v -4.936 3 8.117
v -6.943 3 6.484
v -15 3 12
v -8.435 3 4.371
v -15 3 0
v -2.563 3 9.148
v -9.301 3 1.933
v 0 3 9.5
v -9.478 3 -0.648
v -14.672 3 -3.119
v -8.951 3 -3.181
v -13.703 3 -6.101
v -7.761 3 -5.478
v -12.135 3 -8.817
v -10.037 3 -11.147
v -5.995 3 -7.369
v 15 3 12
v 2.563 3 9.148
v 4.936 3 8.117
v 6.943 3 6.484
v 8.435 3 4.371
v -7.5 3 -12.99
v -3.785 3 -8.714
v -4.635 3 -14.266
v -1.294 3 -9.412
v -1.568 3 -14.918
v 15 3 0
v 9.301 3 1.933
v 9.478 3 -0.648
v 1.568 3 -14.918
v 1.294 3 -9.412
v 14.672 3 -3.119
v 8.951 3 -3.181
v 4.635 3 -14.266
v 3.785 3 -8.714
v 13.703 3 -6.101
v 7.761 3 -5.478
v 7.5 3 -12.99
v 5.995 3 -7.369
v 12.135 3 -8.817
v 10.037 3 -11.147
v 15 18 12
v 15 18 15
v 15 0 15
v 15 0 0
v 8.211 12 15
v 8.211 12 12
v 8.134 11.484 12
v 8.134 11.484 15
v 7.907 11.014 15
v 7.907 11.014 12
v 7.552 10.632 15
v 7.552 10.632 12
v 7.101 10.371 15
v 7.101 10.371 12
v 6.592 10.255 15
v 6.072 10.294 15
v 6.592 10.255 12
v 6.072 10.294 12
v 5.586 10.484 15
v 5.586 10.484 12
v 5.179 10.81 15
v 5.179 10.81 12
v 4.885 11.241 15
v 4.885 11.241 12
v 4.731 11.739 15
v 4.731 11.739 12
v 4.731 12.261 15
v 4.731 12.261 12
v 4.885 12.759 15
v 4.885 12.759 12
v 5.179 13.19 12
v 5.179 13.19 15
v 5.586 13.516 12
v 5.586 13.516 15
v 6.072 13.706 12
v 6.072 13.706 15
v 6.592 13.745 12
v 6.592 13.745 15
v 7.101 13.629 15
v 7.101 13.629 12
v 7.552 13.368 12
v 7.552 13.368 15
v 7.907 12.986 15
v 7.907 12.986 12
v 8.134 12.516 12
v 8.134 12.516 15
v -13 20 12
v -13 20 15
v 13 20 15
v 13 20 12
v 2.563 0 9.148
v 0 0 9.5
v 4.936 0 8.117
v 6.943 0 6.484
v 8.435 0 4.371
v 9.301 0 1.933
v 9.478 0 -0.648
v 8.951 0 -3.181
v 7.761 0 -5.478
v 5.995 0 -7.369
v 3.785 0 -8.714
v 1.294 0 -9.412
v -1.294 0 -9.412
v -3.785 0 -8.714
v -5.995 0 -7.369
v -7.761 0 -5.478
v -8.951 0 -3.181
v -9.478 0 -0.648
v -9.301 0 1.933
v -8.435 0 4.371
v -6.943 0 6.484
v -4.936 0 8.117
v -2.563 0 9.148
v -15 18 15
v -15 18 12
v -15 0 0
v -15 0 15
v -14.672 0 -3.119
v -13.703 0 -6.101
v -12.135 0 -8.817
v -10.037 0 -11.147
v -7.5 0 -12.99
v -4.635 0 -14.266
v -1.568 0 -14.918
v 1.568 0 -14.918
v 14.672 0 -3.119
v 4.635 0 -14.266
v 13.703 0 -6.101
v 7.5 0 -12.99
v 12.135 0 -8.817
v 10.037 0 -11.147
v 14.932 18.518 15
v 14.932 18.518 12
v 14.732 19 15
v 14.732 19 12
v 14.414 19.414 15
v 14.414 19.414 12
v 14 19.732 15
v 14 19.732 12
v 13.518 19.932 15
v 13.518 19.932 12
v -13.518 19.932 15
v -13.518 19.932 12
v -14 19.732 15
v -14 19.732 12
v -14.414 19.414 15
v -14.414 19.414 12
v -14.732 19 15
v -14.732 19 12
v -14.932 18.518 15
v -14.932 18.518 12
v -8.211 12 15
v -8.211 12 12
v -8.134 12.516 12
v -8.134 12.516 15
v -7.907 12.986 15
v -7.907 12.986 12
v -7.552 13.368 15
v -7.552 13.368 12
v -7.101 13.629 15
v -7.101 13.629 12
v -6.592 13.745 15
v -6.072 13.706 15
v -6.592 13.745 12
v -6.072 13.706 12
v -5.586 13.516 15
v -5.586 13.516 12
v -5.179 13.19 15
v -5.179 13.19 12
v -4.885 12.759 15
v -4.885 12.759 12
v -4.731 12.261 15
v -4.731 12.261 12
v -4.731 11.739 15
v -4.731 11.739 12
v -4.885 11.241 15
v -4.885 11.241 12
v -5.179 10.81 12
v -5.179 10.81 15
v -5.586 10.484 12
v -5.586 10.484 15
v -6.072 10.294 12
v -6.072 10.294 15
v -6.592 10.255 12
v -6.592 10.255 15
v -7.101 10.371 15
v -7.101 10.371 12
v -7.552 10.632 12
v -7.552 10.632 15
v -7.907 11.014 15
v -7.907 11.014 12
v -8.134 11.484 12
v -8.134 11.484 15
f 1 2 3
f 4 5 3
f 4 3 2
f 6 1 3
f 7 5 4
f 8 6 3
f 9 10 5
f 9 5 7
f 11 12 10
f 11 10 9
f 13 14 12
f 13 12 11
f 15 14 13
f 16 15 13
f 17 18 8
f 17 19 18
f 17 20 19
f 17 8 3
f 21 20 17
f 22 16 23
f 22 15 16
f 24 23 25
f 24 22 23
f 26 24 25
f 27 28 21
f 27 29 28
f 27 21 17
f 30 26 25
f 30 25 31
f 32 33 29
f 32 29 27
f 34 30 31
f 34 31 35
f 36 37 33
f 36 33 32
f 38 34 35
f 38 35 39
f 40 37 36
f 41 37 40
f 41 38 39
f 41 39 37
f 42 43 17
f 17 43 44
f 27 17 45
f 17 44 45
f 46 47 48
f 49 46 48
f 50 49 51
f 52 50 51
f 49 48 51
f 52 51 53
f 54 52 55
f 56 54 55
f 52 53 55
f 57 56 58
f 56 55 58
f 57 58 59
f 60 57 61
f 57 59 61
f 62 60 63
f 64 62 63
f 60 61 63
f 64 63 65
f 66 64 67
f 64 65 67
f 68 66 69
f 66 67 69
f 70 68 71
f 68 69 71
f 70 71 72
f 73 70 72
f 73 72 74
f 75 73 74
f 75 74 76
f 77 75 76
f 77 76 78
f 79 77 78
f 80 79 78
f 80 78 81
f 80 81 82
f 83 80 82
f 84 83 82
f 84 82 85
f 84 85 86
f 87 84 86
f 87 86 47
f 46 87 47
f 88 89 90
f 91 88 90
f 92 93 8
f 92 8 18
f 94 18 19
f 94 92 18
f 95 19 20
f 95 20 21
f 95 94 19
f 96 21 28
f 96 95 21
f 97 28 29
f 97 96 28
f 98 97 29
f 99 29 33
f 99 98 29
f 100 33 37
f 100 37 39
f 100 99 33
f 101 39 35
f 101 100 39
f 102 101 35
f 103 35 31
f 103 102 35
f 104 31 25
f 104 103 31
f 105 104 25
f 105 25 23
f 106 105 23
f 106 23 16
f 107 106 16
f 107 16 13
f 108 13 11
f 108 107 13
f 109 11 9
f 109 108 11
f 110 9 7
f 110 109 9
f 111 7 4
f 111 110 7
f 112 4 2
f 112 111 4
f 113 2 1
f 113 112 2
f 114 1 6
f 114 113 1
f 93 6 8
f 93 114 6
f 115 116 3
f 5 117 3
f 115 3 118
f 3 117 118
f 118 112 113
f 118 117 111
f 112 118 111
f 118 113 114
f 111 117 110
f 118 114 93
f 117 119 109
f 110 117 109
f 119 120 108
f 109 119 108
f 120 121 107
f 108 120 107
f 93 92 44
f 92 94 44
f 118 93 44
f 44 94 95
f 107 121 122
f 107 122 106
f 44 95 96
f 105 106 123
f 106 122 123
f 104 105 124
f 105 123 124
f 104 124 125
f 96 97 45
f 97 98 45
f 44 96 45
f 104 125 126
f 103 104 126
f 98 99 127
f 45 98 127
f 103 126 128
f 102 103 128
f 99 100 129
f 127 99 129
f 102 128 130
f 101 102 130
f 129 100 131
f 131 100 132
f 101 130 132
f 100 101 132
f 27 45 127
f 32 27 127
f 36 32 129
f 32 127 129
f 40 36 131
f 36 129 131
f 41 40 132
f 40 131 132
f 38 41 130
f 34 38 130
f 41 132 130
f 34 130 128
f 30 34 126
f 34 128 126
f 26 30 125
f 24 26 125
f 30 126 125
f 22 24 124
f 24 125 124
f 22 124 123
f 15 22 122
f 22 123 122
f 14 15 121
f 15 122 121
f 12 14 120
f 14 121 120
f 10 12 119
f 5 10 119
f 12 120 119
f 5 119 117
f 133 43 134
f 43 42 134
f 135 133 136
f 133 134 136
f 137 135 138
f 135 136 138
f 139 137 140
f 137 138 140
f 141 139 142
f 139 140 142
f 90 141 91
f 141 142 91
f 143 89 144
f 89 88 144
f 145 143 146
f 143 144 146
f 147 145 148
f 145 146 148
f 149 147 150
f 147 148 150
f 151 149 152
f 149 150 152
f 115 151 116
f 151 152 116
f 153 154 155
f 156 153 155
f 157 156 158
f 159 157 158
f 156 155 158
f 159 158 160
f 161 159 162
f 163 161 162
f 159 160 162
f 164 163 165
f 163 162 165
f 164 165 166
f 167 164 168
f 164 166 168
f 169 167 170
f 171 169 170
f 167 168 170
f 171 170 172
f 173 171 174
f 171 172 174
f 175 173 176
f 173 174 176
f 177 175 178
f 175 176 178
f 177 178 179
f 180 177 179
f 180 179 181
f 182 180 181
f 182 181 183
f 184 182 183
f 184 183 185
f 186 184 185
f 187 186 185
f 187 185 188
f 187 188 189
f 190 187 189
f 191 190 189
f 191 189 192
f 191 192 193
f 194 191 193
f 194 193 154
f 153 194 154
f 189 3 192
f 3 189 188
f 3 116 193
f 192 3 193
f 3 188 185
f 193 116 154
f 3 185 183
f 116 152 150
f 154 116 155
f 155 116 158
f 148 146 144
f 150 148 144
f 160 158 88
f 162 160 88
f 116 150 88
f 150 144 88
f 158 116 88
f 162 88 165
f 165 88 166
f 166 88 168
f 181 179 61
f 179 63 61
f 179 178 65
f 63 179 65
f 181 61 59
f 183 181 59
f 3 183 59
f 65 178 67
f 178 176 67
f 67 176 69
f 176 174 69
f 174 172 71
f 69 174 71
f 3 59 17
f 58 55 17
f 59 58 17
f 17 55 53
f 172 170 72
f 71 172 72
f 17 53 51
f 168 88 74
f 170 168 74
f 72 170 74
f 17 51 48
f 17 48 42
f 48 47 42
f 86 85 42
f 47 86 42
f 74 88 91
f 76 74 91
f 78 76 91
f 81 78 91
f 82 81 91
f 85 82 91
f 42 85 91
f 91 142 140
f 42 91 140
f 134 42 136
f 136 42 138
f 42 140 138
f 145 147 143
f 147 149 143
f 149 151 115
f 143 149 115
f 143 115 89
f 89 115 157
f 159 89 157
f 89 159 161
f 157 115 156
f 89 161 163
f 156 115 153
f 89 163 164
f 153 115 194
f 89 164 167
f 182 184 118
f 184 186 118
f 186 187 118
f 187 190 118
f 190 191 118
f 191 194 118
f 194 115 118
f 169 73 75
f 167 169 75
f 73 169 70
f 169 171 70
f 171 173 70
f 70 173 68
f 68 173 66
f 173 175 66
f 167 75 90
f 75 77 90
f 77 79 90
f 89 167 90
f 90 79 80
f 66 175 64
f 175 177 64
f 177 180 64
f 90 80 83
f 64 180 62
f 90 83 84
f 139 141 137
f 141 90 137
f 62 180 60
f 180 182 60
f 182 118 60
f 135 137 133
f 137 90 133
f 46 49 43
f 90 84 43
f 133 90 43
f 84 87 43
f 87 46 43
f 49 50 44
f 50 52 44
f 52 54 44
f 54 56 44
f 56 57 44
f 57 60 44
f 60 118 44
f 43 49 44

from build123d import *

# Parameters (mm, degrees)
SKETCH_1_R          = 9.5
EXTRUDE_2_DEPTH     = 3
SKETCH_9_W          = 30
SKETCH_9_H          = 20
EXTRUDE_3_DEPTH     = 3
SKETCH_10_R         = 1.75
CUT_EXTRUDE_1_DEPTH = 37.796738986
FILLET_6_R          = 2


with BuildPart() as part:
    # 草图1 → 凸台-拉伸2 (new body)
    with BuildSketch(Plane(origin=(0, 0, 0), x_dir=(1, 0, 0), z_dir=(0, 1, 0))):
        with BuildLine():
            Line((15, -15), (15, 0))
            ThreePointArc((15, 0), (0, 15), (-15, 0))
            Line((-15, 0), (-15, -15))
            Line((-15, -15), (15, -15))
        make_face()
        with Locations(Location((0, 0, 0), (0, 0, 270))):
            Circle(SKETCH_1_R, mode=Mode.SUBTRACT)
    extrude(amount=EXTRUDE_2_DEPTH)

    # 草图9 → 凸台-拉伸3 (add)
    with BuildSketch(Plane.XY.offset(15)):
        with Locations((0, 10)):
            Rectangle(SKETCH_9_W, SKETCH_9_H)
    extrude(amount=-EXTRUDE_3_DEPTH)

    # 草图10 → 切除-拉伸1 (cut, through all)
    with BuildSketch(Plane(origin=(0, 0, 12), x_dir=(-1, 0, 0), z_dir=(0, 0, -1))):
        with Locations((6.461379144, 12)):
            Circle(SKETCH_10_R)
        with Locations(Location((-6.461379144, 12, 0), (0, 0, 180))):
            Circle(SKETCH_10_R)
    extrude(amount=-CUT_EXTRUDE_1_DEPTH, mode=Mode.SUBTRACT)

    # 圆角6
    fillet_6_edges = [part.edges().sort_by_distance(p)[0] for p in [
        (-15, 20, 13.5),
        (15, 20, 13.5),
    ]]
    fillet(fillet_6_edges, radius=FILLET_6_R)


solid = part.part
